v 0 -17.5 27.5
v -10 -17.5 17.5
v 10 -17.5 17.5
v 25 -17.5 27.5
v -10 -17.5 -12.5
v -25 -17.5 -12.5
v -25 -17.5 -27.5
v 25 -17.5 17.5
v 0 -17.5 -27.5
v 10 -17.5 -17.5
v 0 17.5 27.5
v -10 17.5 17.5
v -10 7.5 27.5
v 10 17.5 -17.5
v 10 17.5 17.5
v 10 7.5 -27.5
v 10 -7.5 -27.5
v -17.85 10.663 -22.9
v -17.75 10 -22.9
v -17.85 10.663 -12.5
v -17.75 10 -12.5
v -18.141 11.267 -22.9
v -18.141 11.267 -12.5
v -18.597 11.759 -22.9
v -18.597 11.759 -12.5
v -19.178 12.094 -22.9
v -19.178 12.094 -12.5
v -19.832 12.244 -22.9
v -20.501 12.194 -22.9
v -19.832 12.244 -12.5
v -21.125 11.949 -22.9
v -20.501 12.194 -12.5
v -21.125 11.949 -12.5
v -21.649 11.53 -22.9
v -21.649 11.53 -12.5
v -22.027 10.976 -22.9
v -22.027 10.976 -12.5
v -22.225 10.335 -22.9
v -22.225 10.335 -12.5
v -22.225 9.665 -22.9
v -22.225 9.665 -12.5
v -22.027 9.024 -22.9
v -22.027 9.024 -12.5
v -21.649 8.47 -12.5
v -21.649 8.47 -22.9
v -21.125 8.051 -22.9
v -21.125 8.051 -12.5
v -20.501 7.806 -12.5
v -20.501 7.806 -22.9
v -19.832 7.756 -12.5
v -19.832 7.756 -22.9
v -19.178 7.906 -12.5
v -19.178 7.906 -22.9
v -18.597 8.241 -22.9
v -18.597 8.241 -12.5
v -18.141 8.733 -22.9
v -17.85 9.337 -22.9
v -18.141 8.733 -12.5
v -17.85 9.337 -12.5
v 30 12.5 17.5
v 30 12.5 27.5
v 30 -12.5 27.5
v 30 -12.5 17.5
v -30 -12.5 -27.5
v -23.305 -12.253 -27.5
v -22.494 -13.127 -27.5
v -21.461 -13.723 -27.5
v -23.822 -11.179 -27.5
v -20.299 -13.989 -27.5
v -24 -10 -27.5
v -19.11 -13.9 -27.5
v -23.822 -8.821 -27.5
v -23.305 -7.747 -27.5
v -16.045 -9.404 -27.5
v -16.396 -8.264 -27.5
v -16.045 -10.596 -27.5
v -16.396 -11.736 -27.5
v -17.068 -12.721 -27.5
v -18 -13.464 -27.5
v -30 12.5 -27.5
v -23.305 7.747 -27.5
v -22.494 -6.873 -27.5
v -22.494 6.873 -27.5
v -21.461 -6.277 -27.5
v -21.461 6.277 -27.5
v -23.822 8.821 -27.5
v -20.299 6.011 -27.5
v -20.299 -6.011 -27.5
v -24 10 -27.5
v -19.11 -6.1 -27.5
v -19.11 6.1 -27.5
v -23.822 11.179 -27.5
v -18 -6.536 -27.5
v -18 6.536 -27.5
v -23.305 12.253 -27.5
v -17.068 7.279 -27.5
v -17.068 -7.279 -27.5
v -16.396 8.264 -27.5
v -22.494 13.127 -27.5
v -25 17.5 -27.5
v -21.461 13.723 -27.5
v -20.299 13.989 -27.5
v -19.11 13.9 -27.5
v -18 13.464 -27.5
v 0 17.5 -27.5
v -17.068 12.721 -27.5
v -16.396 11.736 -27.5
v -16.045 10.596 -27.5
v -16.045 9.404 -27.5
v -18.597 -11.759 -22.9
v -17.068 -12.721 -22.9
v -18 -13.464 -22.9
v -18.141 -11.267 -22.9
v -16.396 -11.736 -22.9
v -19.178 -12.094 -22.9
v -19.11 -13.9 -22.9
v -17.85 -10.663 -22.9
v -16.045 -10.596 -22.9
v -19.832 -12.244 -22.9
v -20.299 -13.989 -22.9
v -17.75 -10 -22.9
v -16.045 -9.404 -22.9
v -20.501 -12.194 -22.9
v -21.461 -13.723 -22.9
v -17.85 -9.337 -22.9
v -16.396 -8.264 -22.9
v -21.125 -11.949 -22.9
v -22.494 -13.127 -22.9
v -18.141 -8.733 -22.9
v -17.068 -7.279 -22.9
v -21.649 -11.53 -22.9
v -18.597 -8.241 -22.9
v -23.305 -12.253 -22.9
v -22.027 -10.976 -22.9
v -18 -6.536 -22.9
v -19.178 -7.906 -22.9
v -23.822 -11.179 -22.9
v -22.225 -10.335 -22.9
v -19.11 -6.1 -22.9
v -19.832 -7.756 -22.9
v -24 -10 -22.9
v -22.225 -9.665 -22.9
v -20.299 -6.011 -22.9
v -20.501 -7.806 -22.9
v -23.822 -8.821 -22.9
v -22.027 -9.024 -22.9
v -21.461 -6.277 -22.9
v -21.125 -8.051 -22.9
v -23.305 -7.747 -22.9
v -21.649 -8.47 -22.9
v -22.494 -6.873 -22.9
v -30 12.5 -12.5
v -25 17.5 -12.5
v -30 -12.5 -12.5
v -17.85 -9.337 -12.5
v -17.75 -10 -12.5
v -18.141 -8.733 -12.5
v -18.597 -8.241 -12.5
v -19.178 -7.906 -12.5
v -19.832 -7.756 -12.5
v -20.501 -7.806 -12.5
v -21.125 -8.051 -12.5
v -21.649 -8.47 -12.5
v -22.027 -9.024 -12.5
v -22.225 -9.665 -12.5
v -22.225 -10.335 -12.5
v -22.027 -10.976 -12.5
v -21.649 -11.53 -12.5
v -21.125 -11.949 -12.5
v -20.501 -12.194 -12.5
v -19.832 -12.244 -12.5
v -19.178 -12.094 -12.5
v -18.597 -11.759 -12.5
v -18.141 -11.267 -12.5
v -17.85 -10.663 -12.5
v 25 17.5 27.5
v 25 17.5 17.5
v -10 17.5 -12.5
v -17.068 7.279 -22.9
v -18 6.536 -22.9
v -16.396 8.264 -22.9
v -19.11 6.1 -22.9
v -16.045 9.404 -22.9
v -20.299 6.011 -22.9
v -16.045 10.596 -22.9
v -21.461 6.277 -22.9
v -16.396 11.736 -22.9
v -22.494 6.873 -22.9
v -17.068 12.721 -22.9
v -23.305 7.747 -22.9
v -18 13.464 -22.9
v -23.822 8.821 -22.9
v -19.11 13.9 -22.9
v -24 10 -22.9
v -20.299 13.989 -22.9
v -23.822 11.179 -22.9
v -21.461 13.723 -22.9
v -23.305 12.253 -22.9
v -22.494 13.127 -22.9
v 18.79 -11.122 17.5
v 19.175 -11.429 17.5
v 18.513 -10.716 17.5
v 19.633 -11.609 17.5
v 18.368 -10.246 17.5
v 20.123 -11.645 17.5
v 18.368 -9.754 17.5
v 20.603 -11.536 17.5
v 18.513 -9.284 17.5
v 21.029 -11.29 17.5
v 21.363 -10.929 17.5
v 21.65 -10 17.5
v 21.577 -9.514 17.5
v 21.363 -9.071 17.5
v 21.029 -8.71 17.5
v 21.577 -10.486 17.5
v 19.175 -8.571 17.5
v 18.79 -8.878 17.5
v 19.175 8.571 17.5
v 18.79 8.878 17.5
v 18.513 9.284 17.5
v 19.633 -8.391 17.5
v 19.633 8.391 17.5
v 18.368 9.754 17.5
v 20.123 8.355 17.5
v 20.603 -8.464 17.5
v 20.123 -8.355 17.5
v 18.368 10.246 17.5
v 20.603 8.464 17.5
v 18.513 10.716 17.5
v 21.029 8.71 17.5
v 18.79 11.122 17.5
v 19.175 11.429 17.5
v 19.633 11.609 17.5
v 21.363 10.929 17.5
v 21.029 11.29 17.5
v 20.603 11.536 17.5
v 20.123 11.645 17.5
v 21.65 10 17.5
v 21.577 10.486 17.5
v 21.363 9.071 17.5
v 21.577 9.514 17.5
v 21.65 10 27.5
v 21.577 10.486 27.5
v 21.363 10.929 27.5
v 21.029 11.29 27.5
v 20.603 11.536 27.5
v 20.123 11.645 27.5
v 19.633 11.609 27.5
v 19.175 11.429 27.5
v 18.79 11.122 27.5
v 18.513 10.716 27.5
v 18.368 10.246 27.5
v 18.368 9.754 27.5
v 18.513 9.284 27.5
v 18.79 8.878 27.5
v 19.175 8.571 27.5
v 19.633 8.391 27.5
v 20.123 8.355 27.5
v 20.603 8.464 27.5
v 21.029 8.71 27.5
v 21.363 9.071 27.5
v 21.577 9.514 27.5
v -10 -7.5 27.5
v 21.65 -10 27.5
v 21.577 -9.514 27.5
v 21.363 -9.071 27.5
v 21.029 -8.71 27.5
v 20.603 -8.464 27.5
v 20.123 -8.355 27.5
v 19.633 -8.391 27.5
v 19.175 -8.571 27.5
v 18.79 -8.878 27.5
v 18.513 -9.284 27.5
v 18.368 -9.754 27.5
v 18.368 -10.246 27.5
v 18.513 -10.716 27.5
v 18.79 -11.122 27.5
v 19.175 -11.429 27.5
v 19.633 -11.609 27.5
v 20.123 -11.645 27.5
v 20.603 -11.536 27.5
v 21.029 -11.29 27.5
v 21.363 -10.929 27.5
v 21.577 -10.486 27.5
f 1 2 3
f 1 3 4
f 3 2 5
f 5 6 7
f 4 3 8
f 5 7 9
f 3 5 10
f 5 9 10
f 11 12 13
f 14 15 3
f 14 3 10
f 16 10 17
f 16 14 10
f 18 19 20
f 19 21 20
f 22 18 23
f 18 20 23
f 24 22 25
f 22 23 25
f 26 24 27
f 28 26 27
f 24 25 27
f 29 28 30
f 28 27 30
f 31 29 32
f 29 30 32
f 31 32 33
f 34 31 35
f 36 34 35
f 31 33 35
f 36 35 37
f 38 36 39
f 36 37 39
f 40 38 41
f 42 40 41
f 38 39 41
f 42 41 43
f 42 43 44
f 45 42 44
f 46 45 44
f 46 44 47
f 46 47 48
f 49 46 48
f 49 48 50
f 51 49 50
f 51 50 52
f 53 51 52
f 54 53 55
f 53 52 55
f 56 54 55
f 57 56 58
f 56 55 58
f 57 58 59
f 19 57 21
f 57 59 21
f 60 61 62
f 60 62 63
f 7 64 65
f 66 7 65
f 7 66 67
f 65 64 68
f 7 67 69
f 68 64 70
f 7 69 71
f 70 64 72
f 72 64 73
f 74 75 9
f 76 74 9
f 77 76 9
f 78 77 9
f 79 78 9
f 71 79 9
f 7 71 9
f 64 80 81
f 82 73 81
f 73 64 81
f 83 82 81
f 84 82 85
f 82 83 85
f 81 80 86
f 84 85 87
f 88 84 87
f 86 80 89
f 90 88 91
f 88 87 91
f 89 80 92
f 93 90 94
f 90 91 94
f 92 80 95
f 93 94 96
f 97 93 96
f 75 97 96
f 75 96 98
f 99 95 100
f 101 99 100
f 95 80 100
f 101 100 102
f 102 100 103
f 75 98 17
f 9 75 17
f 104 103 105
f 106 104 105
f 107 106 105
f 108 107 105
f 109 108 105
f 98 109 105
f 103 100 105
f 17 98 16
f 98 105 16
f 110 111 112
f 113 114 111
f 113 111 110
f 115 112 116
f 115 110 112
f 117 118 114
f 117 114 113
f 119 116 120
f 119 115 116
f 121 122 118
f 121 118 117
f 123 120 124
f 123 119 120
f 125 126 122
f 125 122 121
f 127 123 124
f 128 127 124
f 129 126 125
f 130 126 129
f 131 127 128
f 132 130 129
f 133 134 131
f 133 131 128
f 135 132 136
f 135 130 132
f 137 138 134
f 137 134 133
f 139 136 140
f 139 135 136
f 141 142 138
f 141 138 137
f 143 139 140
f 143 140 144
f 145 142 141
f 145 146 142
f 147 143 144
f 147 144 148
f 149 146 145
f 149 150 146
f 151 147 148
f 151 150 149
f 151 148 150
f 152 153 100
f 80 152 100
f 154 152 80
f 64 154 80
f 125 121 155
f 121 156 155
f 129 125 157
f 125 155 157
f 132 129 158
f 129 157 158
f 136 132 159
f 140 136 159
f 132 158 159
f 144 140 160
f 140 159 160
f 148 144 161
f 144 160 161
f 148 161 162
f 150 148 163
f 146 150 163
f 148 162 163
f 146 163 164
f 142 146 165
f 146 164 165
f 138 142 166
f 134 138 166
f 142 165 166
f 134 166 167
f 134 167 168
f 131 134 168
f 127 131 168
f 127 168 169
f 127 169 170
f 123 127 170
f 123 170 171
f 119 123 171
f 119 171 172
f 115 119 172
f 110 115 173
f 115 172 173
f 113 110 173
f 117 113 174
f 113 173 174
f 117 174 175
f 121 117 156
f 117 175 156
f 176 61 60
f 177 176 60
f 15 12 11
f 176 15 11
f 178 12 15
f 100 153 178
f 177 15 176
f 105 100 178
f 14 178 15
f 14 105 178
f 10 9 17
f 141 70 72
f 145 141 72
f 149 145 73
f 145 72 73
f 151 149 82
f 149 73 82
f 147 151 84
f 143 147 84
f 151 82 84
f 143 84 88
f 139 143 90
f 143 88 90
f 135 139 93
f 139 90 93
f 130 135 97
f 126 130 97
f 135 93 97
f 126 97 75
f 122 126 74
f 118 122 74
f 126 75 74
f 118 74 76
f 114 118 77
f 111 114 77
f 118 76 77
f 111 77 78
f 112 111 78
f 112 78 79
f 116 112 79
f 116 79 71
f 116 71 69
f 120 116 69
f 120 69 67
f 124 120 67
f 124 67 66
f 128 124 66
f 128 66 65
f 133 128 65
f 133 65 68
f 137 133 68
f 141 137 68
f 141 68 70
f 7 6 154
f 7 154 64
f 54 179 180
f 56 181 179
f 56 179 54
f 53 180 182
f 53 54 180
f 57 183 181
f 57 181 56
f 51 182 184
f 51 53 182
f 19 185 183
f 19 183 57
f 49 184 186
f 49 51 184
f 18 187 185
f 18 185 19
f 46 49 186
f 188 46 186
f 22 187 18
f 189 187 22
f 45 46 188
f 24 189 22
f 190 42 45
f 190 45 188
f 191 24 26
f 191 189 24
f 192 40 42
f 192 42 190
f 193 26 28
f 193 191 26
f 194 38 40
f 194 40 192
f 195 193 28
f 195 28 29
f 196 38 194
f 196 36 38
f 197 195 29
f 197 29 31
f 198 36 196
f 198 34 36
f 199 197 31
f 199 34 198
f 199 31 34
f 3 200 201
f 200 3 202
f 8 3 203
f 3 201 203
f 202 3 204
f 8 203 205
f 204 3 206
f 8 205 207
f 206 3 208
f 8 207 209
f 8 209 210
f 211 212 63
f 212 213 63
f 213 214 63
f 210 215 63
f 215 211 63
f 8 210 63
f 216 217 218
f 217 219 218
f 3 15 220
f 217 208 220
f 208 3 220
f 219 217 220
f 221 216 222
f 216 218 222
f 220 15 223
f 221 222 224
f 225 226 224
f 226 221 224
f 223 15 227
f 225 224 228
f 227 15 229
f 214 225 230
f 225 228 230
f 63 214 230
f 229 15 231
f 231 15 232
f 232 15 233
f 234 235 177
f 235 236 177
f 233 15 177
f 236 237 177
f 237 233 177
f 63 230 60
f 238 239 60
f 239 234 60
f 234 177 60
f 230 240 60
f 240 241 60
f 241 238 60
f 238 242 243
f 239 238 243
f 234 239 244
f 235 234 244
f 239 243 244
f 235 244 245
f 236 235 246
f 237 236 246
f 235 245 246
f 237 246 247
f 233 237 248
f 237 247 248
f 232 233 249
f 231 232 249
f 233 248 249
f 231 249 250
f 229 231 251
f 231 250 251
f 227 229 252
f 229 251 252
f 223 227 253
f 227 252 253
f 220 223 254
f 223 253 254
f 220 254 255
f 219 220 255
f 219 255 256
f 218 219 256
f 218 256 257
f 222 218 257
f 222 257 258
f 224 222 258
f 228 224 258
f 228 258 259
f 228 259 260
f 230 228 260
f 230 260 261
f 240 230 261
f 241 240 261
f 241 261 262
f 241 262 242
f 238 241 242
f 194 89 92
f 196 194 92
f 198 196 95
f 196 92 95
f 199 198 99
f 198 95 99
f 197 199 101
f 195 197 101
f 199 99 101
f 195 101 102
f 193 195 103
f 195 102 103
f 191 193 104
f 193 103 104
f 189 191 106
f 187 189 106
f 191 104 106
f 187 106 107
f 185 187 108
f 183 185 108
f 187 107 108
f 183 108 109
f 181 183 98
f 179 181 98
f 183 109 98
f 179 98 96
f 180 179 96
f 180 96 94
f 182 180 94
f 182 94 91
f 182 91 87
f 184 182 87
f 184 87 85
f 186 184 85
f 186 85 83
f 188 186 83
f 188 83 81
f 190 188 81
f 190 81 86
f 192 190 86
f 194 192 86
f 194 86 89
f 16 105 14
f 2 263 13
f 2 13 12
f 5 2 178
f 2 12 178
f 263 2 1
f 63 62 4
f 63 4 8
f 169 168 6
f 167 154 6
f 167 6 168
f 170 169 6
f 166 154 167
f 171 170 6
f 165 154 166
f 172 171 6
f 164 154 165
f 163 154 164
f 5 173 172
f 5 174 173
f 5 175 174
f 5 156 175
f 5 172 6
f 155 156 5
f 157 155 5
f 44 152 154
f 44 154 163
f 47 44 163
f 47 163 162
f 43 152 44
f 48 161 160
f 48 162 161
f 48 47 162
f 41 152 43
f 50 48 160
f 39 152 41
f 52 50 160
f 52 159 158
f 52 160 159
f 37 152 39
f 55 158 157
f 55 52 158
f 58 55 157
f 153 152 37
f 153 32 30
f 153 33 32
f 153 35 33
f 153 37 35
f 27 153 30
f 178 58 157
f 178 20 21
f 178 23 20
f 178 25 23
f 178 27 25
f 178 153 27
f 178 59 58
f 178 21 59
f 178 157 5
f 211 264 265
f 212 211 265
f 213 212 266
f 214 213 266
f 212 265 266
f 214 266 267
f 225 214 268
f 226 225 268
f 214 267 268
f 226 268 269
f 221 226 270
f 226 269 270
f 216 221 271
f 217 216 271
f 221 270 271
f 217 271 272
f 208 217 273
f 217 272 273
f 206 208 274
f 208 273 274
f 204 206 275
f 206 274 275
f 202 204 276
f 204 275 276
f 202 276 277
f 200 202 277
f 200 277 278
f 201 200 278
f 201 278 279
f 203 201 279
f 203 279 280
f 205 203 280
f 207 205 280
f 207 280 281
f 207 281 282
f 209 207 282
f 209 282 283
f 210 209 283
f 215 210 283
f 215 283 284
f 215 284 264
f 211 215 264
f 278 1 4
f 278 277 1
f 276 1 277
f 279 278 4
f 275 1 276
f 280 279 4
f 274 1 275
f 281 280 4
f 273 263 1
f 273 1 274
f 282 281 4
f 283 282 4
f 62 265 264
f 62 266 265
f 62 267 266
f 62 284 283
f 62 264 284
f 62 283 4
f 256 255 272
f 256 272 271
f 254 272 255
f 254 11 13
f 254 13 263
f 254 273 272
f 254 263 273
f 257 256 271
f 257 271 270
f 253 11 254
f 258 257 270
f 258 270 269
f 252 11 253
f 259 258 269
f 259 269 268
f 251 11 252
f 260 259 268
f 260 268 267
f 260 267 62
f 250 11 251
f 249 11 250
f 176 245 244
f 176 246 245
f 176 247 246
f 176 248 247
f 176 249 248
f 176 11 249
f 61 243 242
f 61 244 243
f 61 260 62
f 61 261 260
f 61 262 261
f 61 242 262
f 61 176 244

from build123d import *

# Parameters (mm, degrees)
SKETCH1_W                                            = 60
SKETCH1_H                                            = 55
BOSS_EXTRUDE1_DEPTH                                  = 17.5
SKETCH2_W                                            = 20
SKETCH2_H                                            = 45
SKETCH2_H_2                                          = 40
CUT_EXTRUDE1_DEPTH                                   = 54.677276384
M4_TAPPED_HOLE1_D                                    = 3.3
CBORE_FOR_M4_HEXAGON_SOCKET_HEAD_CAP_SCR_D           = 4.5
CBORE_FOR_M4_HEXAGON_SOCKET_HEAD_CAP_SCR_CBORE_D     = 8
CBORE_FOR_M4_HEXAGON_SOCKET_HEAD_CAP_SCR_CBORE_DEPTH = 4.6
CHAMFER1_SIZE                                        = 5
CHAMFER2_START                                       = 25.980762114
CHAMFER2_OUTLINE_W                                   = 15
CHAMFER2_OUTLINE_H                                   = 17
CHAMFER2_DEPTH                                       = 7.019237886
CHAMFER3_START                                       = -33
CHAMFER3_OUTLINE_W                                   = 15
CHAMFER3_OUTLINE_H                                   = 17
CHAMFER3_DEPTH                                       = 7.019237886


with BuildPart() as part:
    # Sketch1 → Boss-Extrude1 (new, symmetric)
    with BuildSketch(Plane(origin=(0, 0, 0), x_dir=(1, 0, 0), z_dir=(0, 1, 0))):
        Rectangle(SKETCH1_W, SKETCH1_H)
    extrude(amount=BOSS_EXTRUDE1_DEPTH, both=True)

    # Sketch2 → Cut-Extrude1 (cut, through all)
    with BuildSketch(Plane(origin=(0, 17.5, 0), x_dir=(1, 0, 0), z_dir=(0, 1, 0))):
        with Locations((20, 5)):
            Rectangle(SKETCH2_W, SKETCH2_H)
        with Locations((-20, -7.5)):
            Rectangle(SKETCH2_W, SKETCH2_H_2)
    extrude(amount=-CUT_EXTRUDE1_DEPTH, mode=Mode.SUBTRACT)

    # M4 Tapped Hole1 (through all)
    with Locations(Plane(origin=(0, 0, 17.5), x_dir=(-1, 0, 0), z_dir=(0, 0, -1))):
        with Locations((-20, 10), (-20, -10)):
            Hole(M4_TAPPED_HOLE1_D / 2)

    # CBORE for M4 Hexagon socket head cap screws1 (through all)
    with Locations(Plane(origin=(0, 0, -27.5), x_dir=(-1, 0, 0), z_dir=(0, 0, -1))):
        with Locations((20, 10), (20, -10)):
            CounterBoreHole(CBORE_FOR_M4_HEXAGON_SOCKET_HEAD_CAP_SCR_D / 2, CBORE_FOR_M4_HEXAGON_SOCKET_HEAD_CAP_SCR_CBORE_D / 2, CBORE_FOR_M4_HEXAGON_SOCKET_HEAD_CAP_SCR_CBORE_DEPTH)

    # Chamfer1
    chamfer1_edges = [part.edges().sort_by_distance(p)[0] for p in [
        (30, 17.5, 22.5),
        (-30, 17.5, -20),
        (30, -17.5, 22.5),
        (-30, -17.5, -20),
    ]]
    chamfer(chamfer1_edges, length=CHAMFER1_SIZE)

    # Chamfer2: read off the stored shape, not the designer's step
    # Chamfer2 outline → Chamfer2 (cut)
    with BuildSketch(Plane(origin=(0, 0, 0), x_dir=(0.8164965809277258, 0.40824829046386313, 0.40824829046386313), z_dir=(0.5773502691896258, -0.5773502691896258, -0.5773502691896258)).offset(CHAMFER2_START)):
        with Locations((-12.5, -7.5)):
            Rectangle(CHAMFER2_OUTLINE_W, CHAMFER2_OUTLINE_H)
    chamfer2 = extrude(amount=CHAMFER2_DEPTH, mode=Mode.SUBTRACT)

    # Chamfer3: read off the stored shape, not the designer's step
    # Chamfer3 outline → Chamfer3 (cut)
    with BuildSketch(Plane(origin=(0, 0, 0), x_dir=(0.8164965809277258, -0.40824829046386313, 0.40824829046386313), z_dir=(0.5773502691896258, 0.5773502691896258, -0.5773502691896258)).offset(CHAMFER3_START)):
        with Locations((12.5, -7.5)):
            Rectangle(CHAMFER3_OUTLINE_W, CHAMFER3_OUTLINE_H)
    chamfer3 = extrude(amount=CHAMFER3_DEPTH, mode=Mode.SUBTRACT)

    # Mirror1: Chamfer2, Chamfer3 across plane
    add(chamfer2.mirror(Plane.ZX), mode=Mode.SUBTRACT)
    add(chamfer3.mirror(Plane.ZX), mode=Mode.SUBTRACT)


solid = part.part
